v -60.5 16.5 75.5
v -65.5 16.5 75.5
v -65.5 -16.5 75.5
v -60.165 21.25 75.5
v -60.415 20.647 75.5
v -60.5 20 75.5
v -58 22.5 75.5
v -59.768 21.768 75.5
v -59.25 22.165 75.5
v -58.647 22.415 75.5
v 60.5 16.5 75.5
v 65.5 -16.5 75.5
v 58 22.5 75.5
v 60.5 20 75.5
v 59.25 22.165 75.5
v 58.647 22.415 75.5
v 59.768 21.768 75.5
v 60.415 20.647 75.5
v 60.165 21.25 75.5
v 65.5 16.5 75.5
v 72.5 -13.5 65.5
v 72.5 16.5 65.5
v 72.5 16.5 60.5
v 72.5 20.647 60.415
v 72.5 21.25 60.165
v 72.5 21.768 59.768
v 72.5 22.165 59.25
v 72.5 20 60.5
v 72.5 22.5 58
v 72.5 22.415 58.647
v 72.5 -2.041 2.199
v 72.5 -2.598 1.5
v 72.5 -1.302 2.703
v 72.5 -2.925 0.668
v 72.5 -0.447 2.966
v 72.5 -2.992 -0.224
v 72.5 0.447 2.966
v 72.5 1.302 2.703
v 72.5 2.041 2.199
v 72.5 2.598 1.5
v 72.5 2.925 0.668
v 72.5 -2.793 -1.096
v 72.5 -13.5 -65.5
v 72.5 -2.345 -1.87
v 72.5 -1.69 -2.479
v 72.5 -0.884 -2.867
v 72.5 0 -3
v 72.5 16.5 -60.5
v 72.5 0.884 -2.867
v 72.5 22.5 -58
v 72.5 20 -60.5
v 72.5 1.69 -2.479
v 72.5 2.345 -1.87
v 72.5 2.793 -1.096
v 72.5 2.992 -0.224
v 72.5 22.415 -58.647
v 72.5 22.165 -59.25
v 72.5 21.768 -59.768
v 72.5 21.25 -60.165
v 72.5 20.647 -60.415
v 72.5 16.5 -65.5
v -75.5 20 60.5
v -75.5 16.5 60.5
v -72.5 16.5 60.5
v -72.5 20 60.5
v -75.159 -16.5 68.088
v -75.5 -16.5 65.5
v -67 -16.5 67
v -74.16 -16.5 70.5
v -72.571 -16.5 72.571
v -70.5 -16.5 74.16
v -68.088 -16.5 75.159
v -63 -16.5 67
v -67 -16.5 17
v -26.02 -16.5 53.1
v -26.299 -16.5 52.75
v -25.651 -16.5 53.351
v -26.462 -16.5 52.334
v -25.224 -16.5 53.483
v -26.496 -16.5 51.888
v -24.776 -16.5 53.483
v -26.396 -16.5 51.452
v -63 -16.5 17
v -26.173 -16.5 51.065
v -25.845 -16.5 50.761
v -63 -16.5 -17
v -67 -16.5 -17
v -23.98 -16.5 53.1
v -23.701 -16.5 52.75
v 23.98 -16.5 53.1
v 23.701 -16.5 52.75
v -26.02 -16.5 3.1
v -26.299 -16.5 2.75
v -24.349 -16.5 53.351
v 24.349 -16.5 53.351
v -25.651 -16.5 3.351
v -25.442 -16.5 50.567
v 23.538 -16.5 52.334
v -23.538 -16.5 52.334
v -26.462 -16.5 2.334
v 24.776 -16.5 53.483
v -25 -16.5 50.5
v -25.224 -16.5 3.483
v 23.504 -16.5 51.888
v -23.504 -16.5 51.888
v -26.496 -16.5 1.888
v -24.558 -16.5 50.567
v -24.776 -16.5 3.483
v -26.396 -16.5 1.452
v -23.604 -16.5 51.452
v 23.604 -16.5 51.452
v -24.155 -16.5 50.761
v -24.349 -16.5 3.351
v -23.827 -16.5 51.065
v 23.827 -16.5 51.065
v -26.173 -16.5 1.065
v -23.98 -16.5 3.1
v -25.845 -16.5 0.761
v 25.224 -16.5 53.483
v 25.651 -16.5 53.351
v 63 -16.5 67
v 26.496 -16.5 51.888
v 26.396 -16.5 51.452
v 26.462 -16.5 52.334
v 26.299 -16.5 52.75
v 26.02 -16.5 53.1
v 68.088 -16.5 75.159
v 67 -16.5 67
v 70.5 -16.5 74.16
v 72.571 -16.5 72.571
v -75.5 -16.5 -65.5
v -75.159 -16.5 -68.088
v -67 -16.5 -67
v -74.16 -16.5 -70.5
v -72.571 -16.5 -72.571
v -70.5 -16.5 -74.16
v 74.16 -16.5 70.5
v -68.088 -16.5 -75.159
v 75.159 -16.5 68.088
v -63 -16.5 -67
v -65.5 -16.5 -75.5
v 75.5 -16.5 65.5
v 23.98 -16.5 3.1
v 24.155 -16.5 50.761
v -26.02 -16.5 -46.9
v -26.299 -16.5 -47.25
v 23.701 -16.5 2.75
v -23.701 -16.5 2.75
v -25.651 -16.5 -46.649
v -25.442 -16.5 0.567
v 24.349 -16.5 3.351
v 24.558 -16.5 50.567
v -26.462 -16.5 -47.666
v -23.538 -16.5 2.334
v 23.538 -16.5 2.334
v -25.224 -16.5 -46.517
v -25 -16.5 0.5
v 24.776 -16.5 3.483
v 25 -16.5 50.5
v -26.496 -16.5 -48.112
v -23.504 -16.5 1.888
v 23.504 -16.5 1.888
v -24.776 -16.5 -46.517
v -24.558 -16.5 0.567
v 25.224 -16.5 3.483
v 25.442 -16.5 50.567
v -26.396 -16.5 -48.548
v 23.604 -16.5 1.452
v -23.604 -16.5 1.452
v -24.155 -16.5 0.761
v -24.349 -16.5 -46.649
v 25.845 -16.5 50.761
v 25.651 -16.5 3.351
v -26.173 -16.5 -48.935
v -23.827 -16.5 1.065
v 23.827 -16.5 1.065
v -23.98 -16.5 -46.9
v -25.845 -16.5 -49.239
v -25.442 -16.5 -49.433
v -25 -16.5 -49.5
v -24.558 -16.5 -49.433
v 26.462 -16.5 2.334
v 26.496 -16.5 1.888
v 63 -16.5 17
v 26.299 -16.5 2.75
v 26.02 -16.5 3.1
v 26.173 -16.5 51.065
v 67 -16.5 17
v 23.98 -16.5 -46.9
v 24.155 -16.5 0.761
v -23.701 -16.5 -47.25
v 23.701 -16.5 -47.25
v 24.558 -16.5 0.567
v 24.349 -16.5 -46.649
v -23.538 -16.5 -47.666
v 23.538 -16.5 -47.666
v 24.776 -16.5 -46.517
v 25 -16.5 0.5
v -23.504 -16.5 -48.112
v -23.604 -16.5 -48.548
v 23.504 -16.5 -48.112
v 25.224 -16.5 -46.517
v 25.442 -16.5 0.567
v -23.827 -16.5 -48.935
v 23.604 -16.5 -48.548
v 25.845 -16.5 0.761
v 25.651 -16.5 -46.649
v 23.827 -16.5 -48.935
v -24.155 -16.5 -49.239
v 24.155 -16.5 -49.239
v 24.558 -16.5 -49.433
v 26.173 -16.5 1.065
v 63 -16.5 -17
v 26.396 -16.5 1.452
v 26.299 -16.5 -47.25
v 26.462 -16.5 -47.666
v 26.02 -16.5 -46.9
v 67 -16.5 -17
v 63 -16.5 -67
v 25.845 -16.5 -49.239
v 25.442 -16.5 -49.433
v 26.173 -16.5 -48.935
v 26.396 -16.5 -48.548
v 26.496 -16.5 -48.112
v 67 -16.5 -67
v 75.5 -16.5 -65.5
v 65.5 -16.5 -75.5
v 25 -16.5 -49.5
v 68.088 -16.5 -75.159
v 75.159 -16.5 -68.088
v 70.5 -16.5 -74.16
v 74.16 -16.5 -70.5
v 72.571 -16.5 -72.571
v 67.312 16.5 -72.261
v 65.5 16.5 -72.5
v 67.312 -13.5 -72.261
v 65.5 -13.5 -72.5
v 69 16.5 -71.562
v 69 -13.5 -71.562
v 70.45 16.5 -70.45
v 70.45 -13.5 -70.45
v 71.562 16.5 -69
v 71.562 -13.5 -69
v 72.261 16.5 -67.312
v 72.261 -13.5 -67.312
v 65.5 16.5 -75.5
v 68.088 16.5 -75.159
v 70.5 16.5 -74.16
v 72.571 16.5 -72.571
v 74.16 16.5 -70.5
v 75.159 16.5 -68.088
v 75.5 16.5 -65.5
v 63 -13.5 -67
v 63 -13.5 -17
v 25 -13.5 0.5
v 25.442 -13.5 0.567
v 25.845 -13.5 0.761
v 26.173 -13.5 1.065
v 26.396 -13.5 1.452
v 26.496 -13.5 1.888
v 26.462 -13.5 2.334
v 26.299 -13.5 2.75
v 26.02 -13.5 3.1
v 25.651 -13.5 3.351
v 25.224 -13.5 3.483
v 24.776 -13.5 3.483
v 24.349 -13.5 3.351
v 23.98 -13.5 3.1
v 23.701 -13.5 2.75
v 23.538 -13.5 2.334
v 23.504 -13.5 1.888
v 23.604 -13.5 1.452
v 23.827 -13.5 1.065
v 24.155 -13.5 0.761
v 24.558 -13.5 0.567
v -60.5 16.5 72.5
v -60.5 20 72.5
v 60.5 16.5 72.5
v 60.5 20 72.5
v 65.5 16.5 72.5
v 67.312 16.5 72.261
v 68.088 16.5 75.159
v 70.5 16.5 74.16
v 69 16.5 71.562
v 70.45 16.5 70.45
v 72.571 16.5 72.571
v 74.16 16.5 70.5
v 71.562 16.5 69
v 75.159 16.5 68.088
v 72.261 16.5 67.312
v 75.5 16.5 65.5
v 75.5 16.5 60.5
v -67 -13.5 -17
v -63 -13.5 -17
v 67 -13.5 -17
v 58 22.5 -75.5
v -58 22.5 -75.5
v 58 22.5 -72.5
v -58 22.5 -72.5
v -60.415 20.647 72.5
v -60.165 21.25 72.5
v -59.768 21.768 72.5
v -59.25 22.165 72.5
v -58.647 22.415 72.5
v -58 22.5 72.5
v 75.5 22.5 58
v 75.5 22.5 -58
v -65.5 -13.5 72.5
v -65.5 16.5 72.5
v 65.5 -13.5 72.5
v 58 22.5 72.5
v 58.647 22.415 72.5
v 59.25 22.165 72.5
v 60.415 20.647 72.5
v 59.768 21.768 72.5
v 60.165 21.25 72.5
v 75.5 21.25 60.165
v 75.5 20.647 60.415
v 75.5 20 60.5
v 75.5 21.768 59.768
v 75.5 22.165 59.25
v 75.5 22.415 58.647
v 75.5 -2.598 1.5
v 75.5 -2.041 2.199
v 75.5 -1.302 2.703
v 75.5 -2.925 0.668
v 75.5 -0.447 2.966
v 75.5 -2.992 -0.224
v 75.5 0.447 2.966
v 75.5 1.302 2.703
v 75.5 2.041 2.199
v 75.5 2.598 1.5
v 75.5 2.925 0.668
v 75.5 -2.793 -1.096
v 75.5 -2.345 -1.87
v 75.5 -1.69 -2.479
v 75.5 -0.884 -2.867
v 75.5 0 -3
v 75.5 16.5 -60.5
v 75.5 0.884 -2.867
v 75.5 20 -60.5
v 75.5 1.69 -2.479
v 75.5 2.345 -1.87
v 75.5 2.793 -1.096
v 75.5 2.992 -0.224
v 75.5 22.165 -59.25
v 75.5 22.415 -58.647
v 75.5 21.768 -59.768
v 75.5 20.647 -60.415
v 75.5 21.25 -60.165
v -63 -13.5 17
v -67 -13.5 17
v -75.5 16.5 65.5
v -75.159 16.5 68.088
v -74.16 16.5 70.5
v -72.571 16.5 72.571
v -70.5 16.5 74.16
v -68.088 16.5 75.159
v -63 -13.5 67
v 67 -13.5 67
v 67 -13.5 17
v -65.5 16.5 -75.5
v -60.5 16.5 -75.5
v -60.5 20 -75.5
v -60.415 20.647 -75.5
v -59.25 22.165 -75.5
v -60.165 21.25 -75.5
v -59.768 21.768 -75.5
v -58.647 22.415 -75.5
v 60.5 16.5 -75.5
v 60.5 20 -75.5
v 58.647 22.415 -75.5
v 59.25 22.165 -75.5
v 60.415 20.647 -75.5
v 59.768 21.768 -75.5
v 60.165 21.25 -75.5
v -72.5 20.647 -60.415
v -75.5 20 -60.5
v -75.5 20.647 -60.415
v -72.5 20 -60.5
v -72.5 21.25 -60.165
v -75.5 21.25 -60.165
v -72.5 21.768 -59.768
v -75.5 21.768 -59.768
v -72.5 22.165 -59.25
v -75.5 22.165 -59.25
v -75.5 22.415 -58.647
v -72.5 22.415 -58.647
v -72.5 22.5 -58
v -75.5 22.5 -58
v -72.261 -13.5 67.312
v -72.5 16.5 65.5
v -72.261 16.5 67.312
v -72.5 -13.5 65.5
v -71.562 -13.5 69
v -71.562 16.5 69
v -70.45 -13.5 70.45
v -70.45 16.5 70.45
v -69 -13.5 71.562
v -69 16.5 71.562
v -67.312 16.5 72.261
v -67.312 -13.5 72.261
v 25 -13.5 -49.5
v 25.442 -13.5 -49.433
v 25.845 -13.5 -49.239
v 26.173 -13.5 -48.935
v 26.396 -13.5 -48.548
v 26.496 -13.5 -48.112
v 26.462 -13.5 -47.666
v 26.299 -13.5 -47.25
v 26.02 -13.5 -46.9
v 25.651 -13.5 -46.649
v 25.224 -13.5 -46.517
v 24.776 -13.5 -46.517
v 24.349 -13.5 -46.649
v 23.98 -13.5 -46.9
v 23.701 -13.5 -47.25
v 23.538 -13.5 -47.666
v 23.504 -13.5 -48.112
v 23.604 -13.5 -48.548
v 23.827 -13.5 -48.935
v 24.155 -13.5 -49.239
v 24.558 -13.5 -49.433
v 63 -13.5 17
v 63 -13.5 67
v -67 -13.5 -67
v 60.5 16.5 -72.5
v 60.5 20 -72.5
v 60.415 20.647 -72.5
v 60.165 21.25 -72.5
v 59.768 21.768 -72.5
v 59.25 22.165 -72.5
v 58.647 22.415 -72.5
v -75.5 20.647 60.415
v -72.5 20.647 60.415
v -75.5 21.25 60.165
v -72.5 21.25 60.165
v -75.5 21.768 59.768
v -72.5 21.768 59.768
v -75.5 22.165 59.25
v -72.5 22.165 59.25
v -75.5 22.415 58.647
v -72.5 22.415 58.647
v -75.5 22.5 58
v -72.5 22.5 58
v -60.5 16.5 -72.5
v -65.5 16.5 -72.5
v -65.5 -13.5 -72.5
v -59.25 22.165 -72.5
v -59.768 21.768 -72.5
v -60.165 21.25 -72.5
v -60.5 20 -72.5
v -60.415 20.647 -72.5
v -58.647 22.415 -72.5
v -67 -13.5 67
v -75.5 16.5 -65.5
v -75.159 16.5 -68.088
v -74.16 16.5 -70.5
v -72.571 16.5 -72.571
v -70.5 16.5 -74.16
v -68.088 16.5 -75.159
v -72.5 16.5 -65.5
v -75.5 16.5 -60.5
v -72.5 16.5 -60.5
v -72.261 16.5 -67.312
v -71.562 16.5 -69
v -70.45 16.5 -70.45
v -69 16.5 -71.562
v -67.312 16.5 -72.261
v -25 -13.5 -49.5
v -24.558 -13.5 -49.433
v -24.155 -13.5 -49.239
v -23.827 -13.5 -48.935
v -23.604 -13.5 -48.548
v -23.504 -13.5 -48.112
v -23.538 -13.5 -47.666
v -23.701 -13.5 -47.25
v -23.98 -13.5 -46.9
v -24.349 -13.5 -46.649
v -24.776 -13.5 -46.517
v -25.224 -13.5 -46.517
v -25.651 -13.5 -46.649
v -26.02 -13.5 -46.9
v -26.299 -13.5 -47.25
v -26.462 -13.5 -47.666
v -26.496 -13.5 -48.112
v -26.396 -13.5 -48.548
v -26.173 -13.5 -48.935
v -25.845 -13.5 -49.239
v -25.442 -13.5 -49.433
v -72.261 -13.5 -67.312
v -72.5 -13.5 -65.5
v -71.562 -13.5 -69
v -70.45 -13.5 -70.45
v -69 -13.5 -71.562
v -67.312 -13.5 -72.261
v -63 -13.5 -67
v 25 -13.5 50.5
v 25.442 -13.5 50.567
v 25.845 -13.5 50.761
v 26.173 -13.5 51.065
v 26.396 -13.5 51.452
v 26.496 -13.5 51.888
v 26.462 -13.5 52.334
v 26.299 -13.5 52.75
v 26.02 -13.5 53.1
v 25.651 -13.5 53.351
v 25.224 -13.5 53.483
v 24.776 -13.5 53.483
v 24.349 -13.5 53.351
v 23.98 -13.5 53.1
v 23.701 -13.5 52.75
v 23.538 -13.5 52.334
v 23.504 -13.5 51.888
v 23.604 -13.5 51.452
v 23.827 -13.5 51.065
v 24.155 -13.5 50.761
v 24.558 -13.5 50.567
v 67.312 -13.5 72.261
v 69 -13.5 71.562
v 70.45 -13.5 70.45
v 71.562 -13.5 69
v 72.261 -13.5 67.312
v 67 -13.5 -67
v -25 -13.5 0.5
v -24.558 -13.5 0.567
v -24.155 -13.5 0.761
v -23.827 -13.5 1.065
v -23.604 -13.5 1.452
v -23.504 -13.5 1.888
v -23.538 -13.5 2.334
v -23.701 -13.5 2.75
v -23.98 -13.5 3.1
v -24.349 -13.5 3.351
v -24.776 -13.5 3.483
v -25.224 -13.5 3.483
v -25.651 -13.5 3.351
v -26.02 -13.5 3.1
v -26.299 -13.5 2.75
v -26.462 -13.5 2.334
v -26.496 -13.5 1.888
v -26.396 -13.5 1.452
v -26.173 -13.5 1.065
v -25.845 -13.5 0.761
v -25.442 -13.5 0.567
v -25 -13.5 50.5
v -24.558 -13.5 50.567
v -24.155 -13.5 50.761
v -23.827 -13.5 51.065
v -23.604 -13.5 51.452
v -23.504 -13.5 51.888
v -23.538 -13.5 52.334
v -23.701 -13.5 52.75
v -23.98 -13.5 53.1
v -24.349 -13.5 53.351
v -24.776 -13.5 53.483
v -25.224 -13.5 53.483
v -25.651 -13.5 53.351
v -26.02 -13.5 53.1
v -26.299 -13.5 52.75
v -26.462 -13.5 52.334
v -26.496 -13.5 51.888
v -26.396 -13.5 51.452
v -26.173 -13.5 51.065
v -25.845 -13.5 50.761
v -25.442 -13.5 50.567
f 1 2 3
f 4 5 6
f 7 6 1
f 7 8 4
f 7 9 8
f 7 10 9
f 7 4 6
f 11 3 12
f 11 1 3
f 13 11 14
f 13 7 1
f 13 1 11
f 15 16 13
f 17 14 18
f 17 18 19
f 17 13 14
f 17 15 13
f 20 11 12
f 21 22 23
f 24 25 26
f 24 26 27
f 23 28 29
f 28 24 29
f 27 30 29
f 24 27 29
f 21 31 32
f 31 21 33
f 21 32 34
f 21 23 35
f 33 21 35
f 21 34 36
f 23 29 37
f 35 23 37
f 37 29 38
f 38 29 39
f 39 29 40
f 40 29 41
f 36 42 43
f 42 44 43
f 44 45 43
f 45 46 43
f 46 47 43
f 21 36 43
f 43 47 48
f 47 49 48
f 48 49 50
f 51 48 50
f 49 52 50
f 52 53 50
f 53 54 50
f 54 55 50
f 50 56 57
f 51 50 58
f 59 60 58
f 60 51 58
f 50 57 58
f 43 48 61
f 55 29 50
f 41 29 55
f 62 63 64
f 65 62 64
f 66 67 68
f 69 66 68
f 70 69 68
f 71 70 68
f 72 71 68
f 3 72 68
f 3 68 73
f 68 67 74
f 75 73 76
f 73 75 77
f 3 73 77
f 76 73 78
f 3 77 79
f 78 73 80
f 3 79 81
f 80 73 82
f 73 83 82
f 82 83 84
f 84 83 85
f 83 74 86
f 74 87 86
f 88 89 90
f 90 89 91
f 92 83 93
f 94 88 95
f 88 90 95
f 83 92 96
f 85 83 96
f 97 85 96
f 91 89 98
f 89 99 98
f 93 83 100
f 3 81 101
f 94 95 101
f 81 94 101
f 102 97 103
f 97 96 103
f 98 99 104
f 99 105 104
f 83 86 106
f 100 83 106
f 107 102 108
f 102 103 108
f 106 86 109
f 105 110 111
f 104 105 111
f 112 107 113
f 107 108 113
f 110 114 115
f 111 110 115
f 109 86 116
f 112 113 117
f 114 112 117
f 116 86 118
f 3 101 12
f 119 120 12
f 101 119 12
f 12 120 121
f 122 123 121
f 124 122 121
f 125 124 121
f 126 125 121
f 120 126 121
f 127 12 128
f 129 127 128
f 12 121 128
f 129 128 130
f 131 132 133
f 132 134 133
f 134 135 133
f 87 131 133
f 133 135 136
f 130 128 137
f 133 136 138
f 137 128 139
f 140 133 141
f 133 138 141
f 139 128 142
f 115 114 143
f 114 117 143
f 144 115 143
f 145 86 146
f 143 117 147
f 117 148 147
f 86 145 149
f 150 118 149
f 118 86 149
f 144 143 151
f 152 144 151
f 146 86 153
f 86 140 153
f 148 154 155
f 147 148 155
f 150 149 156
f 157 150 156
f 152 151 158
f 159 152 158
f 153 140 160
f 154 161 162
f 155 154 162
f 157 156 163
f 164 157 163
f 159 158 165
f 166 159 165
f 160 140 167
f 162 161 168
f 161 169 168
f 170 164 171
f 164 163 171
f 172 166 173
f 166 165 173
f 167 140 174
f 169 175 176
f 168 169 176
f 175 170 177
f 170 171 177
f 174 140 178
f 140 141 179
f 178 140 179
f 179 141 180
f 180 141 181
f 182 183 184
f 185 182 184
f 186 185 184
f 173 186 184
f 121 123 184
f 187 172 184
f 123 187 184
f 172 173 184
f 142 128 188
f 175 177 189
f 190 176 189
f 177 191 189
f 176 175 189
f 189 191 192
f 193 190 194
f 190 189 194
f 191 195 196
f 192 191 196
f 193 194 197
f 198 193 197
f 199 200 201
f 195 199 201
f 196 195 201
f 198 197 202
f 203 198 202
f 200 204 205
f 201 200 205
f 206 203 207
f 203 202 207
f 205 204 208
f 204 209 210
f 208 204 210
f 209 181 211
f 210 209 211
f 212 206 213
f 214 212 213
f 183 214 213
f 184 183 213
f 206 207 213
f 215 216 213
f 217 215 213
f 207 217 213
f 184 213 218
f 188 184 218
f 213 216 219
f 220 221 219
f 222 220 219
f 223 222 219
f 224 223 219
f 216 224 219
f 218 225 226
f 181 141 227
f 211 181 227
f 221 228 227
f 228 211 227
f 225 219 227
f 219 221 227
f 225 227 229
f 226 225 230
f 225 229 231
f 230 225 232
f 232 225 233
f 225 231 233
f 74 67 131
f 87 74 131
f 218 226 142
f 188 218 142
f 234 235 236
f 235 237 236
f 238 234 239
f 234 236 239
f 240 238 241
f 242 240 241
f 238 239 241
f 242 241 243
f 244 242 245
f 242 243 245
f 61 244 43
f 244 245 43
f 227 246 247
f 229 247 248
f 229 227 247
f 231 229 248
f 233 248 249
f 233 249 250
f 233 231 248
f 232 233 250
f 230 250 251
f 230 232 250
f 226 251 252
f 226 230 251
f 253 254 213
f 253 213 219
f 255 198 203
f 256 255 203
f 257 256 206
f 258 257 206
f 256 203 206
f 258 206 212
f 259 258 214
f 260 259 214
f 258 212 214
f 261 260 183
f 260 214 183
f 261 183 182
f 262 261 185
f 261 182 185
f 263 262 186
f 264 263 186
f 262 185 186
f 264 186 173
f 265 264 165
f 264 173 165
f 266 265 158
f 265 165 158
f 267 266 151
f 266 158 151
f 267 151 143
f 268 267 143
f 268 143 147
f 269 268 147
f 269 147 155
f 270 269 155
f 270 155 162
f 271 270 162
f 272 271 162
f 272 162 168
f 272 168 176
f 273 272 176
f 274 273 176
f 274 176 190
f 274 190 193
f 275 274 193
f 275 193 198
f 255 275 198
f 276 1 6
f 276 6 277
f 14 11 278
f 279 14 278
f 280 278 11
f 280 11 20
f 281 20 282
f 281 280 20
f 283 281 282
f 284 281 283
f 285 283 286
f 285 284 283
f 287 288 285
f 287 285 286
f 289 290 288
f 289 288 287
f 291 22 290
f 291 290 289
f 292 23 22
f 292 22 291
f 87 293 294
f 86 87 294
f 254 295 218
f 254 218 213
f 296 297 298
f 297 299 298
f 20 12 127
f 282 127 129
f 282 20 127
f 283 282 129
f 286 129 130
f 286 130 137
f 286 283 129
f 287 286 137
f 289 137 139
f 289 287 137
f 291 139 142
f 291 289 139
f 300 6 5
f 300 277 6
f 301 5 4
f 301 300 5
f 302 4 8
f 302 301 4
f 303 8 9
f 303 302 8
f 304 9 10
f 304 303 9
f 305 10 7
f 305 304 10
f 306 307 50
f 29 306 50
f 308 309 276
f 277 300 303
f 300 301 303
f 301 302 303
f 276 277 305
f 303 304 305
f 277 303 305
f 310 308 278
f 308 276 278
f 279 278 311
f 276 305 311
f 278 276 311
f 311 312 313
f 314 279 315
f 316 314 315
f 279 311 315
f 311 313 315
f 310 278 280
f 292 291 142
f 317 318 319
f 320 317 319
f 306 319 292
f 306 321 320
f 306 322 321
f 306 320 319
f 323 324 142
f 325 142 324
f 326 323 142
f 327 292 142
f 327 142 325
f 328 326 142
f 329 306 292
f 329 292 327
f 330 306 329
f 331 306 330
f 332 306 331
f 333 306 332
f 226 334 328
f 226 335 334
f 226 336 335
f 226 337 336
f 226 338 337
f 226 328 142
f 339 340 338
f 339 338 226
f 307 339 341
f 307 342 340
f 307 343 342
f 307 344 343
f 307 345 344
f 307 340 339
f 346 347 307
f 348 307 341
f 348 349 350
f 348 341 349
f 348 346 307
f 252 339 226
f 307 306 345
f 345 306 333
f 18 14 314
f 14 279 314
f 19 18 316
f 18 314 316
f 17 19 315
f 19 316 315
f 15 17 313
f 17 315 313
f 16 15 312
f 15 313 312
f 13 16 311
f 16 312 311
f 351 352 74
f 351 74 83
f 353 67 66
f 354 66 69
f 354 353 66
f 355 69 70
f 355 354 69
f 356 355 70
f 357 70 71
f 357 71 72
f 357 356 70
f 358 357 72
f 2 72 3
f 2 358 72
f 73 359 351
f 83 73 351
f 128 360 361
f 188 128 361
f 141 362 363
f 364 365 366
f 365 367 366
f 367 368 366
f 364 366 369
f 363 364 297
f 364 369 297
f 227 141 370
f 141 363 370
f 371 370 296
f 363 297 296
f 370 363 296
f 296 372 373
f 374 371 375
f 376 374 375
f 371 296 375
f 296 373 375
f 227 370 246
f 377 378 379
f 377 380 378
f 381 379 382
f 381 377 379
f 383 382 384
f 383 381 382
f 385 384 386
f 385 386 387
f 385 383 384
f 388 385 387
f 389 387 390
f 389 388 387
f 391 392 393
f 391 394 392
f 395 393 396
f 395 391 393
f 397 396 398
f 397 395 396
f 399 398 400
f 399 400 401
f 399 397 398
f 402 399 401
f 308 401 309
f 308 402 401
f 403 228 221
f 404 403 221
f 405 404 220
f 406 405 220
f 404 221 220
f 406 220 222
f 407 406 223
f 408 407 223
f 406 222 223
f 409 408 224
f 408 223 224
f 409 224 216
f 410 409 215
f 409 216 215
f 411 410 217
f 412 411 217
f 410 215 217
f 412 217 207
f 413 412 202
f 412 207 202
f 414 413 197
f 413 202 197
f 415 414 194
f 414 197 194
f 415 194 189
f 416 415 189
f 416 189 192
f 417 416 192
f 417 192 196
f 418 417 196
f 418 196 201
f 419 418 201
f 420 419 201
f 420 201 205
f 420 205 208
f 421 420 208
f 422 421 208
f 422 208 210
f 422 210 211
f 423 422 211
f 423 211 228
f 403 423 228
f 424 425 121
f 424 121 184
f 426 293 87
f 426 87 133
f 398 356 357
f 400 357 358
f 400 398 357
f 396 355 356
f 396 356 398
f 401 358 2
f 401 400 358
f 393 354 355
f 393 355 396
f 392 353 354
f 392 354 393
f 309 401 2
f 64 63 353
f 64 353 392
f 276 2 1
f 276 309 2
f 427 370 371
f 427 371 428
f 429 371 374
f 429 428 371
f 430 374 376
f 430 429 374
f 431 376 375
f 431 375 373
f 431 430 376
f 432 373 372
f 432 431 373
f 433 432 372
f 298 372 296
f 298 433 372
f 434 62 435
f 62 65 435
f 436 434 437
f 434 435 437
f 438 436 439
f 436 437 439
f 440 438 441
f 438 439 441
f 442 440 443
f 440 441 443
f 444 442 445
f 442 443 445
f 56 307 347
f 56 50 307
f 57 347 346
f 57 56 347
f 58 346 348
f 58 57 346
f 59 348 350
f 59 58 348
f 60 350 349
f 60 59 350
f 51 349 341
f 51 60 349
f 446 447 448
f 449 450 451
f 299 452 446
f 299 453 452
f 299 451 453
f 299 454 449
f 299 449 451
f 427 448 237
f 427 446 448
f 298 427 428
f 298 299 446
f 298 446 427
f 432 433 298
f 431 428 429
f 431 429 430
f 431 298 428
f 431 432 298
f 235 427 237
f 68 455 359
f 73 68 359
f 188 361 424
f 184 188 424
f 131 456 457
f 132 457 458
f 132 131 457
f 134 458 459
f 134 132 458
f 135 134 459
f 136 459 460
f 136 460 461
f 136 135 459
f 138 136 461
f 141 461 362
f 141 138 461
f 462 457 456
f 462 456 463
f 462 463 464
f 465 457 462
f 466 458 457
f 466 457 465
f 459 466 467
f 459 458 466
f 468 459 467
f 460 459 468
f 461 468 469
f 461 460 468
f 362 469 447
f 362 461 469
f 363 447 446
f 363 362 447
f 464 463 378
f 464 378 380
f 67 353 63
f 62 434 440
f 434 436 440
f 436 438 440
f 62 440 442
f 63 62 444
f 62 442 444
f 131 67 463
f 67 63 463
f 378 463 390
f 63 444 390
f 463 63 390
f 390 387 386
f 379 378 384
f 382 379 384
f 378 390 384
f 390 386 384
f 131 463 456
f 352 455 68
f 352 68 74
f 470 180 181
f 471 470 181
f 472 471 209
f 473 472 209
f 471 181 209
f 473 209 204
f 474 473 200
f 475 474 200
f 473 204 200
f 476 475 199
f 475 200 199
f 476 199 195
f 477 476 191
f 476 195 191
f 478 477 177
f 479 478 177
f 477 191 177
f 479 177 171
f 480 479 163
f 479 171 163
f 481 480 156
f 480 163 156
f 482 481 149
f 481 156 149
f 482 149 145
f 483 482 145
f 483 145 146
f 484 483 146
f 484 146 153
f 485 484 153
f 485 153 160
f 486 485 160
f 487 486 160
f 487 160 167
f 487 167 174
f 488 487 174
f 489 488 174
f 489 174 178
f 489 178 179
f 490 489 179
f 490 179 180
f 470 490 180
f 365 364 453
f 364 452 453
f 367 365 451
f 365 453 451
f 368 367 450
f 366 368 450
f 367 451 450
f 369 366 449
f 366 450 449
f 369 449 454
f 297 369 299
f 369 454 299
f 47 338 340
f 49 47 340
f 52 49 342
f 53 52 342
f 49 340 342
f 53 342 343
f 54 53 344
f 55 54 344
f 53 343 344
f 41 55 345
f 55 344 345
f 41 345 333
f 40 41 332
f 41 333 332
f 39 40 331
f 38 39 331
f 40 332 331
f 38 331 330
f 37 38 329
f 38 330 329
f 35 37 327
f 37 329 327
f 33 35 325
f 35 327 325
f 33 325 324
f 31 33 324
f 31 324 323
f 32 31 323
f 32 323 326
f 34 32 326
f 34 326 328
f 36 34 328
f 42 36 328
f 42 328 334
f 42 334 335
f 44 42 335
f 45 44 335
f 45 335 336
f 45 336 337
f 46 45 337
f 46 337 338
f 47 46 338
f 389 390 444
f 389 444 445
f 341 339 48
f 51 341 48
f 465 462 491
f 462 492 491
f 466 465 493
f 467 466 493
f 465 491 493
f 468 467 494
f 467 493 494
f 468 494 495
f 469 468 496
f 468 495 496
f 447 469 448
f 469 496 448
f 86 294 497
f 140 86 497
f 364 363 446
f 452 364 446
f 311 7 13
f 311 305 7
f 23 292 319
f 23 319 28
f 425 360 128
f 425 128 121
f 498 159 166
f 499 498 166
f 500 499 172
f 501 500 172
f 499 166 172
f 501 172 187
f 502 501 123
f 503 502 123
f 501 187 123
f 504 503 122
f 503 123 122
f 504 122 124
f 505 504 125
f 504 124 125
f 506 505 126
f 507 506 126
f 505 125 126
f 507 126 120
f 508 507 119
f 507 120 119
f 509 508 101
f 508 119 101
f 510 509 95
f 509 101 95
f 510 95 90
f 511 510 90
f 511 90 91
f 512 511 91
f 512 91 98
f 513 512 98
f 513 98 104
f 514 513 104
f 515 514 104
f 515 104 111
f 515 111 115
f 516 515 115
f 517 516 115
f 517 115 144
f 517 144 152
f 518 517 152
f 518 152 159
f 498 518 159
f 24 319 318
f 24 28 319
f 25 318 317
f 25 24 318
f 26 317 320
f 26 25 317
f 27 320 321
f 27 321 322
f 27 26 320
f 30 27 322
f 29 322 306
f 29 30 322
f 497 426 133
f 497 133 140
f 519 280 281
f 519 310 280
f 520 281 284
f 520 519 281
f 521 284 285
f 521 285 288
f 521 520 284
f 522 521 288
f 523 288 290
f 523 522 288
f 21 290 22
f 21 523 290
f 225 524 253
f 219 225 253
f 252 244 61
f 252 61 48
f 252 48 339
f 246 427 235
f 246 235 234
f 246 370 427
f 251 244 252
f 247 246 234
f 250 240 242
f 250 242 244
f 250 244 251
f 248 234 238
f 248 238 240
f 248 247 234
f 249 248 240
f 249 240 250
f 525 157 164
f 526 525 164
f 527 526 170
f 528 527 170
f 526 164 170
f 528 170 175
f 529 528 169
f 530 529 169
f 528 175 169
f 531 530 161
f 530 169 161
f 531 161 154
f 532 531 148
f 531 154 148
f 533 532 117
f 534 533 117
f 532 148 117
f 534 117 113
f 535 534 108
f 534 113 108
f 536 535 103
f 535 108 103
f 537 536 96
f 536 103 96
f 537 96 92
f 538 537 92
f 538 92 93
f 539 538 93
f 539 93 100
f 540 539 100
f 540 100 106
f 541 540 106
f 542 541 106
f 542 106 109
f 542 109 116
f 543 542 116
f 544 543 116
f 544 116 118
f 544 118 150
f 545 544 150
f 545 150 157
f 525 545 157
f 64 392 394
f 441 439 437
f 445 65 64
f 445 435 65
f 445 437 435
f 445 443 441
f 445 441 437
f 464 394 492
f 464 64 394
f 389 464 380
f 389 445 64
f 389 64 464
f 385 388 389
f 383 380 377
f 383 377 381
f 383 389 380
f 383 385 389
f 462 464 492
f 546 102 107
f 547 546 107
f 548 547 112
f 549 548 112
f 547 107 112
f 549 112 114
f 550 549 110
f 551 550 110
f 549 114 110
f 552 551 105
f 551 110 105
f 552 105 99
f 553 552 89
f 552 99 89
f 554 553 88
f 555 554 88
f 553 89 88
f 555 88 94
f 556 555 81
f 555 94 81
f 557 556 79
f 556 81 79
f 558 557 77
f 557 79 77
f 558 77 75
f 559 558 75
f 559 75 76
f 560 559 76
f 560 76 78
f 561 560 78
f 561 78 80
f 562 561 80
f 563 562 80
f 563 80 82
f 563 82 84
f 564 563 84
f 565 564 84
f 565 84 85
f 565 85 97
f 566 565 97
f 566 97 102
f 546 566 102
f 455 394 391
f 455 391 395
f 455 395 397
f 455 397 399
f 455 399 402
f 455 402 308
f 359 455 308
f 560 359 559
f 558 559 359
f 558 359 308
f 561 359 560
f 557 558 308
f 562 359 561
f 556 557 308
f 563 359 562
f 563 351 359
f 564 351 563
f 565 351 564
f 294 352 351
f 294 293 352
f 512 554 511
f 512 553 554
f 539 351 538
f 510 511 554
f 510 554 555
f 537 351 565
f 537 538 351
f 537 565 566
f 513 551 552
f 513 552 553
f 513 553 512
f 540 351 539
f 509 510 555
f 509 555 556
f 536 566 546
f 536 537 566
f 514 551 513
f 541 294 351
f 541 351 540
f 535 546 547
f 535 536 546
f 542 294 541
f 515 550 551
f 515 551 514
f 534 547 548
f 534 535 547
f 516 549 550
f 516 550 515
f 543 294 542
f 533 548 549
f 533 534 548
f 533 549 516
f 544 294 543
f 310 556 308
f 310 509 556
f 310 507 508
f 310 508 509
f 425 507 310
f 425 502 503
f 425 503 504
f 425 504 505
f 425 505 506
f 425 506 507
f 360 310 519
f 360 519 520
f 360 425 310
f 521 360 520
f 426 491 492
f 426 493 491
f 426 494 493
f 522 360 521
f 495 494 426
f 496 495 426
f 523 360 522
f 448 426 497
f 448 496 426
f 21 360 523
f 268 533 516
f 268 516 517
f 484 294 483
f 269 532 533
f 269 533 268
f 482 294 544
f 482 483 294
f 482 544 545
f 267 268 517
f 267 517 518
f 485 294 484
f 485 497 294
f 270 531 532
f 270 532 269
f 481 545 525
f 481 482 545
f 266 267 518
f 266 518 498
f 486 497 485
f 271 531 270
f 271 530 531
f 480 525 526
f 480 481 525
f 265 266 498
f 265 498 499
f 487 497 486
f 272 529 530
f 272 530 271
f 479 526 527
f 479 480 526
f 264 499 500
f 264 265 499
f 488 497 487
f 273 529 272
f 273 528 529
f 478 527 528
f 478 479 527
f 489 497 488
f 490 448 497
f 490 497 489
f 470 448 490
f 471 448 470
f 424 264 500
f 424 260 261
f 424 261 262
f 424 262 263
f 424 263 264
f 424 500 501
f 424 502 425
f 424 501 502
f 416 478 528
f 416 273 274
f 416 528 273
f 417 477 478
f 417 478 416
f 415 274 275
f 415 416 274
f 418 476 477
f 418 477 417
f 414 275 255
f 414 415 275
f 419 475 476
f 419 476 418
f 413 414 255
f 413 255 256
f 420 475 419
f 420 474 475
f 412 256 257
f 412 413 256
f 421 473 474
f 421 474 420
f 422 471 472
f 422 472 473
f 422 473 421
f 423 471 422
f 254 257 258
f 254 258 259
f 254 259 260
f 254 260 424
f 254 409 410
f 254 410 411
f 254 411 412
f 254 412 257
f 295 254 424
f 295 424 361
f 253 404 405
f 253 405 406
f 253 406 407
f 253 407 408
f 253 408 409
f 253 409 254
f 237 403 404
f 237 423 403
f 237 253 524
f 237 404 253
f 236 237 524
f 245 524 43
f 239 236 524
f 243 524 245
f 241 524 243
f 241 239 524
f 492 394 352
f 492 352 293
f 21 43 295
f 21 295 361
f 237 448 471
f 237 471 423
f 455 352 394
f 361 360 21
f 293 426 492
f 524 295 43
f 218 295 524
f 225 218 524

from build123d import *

# Parameters (mm, degrees)
SKETCH1_W           = 151
SKETCH1_H           = 151
BOSS_EXTRUDE1_DEPTH = 16.5
SKETCH2_W           = 145
SKETCH2_H           = 145
CUT_EXTRUDE1_DEPTH  = 30
SKETCH3_W           = 4
SKETCH3_H           = 50
CUT_EXTRUDE2_DEPTH  = 111.907619215
SKETCH6_W           = 121
SKETCH6_H           = 3
BOSS_EXTRUDE2_DEPTH = 6
SKETCH7_W           = 3
SKETCH7_H           = 121
BOSS_EXTRUDE3_DEPTH = 6
CUT_EXTRUDE3_REACH  = 172.316
SKETCH8_R           = 3
FILLET1_R           = 10
FILLET2_R           = 7
FILLET3_R           = 2.5
SKETCH12_R          = 1.5
CUT_EXTRUDE4_DEPTH  = 114.672775984


with BuildPart() as part:
    # Sketch1 → Boss-Extrude1 (new, symmetric)
    with BuildSketch(Plane(origin=(0, 0, 0), x_dir=(1, 0, 0), z_dir=(0, 1, 0))):
        Rectangle(SKETCH1_W, SKETCH1_H)
    extrude(amount=BOSS_EXTRUDE1_DEPTH, both=True)

    # Sketch2 → Cut-Extrude1 (cut)
    with BuildSketch(Plane(origin=(0, 16.5, 0), x_dir=(1, 0, 0), z_dir=(0, 1, 0))):
        Rectangle(SKETCH2_W, SKETCH2_H)
    extrude(amount=-CUT_EXTRUDE1_DEPTH, mode=Mode.SUBTRACT)

    # Sketch3 → Cut-Extrude2 (cut, through all)
    with BuildSketch(Plane(origin=(0, -13.5, 0), x_dir=(1, 0, 0), z_dir=(0, 1, 0))):
        with Locations((-65, -42)):
            Rectangle(SKETCH3_W, SKETCH3_H)
        with Locations((-65, 42)):
            Rectangle(SKETCH3_W, SKETCH3_H)
    cut_extrude2 = extrude(amount=-CUT_EXTRUDE2_DEPTH, mode=Mode.SUBTRACT)

    # Mirror1: Cut-Extrude2 across plane
    add(cut_extrude2.mirror(Plane(origin=(0, 0, 0), x_dir=(0, 0, 1), z_dir=(1, 0, 0))), mode=Mode.SUBTRACT)

    # Sketch6 → Boss-Extrude2 (add)
    with BuildSketch(Plane(origin=(0, 16.5, 0), x_dir=(1, 0, 0), z_dir=(0, 1, 0))):
        with Locations((0, -74)):
            Rectangle(SKETCH6_W, SKETCH6_H)
    boss_extrude2 = extrude(amount=BOSS_EXTRUDE2_DEPTH)

    # Mirror2: Boss-Extrude2 across plane
    add(boss_extrude2.mirror(Plane.XY))

    # Sketch7 → Boss-Extrude3 (add)
    with BuildSketch(Plane(origin=(0, 16.5, 0), x_dir=(1, 0, 0), z_dir=(0, 1, 0))):
        with Locations((-74, 0)):
            Rectangle(SKETCH7_W, SKETCH7_H)
    boss_extrude3 = extrude(amount=BOSS_EXTRUDE3_DEPTH)

    # Mirror4: Boss-Extrude3 across plane
    add(boss_extrude3.mirror(Plane(origin=(0, 0, 0), x_dir=(0, 0, 1), z_dir=(1, 0, 0))))

    # Sketch8 → Cut-Extrude3 (cut, up to next)
    with BuildSketch(Plane(origin=(75.5, 0, 0), x_dir=(0, 0, -1), z_dir=(1, 0, 0)), mode=Mode.PRIVATE) as cut_extrude3_sk1:
        Circle(SKETCH8_R)
    cut_extrude3_tool1 = extrude(cut_extrude3_sk1.sketch, amount=-CUT_EXTRUDE3_REACH, mode=Mode.PRIVATE) & part.part
    add(cut_extrude3_tool1.solids().sort_by_distance((75.5, 0, 0))[0], mode=Mode.SUBTRACT)

    # Fillet1
    fillet1_edges = [part.edges().sort_by_distance(p)[0] for p in [
        (75.5, 0, 75.5),
        (-75.5, 0, 75.5),
        (-75.5, 0, -75.5),
        (75.5, 0, -75.5),
    ]]
    fillet(fillet1_edges, radius=FILLET1_R)

    # Fillet2
    fillet2_edges = [part.edges().sort_by_distance(p)[0] for p in [
        (72.5, 1.5, -72.5),
        (72.5, 1.5, 72.5),
        (-72.5, 1.5, 72.5),
        (-72.5, 1.5, -72.5),
    ]]
    fillet(fillet2_edges, radius=FILLET2_R)

    # Fillet3
    fillet3_edges = [part.edges().sort_by_distance(p)[0] for p in [
        (-60.5, 22.5, -74),
        (60.5, 22.5, -74),
        (-74, 22.5, -60.5),
        (-74, 22.5, 60.5),
        (74, 22.5, 60.5),
        (74, 22.5, -60.5),
        (-60.5, 22.5, 74),
        (60.5, 22.5, 74),
    ]]
    fillet(fillet3_edges, radius=FILLET3_R)

    # Sketch12 → Cut-Extrude4 (cut, through all)
    with BuildSketch(Plane.XZ.offset(16.5)):
        with Locations(Location((-25, 52, 0), (0, 0, 270))):
            Circle(SKETCH12_R)
        with Locations(Location((-25, 2, 0), (0, 0, 270))):
            Circle(SKETCH12_R)
        with Locations(Location((25, 52, 0), (0, 0, 270))):
            Circle(SKETCH12_R)
        with Locations(Location((25, 2, 0), (0, 0, 270))):
            Circle(SKETCH12_R)
        with Locations(Location((-25, -48, 0), (0, 0, 270))):
            Circle(SKETCH12_R)
        with Locations(Location((25, -48, 0), (0, 0, 270))):
            Circle(SKETCH12_R)
    extrude(amount=-CUT_EXTRUDE4_DEPTH, mode=Mode.SUBTRACT)


solid = part.part
